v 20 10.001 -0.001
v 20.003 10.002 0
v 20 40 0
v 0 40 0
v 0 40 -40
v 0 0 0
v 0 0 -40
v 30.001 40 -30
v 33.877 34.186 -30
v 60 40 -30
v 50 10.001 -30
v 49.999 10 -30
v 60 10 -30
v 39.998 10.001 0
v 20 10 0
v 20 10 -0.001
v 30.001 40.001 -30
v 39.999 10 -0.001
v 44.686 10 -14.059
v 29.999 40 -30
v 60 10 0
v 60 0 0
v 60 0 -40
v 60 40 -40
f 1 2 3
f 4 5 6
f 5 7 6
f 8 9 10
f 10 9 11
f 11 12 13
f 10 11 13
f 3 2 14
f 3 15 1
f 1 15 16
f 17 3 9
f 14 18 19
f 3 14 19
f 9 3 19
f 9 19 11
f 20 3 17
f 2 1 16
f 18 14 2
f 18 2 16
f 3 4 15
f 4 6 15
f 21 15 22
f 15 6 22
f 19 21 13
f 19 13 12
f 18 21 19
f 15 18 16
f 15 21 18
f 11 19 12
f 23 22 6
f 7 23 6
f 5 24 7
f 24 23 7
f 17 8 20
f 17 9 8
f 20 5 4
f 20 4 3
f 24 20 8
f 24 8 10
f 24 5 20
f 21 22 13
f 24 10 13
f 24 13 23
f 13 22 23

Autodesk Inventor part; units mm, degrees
ref_plane "YZ Plane" through (0, 0, 0) normal (1, 0, 0) x (0, 1, 0)
ref_plane "XZ Plane" through (0, 0, 0) normal (0, 1, 0) x (-1, 0, 0)
sketch "草圖1" plane through (0, 0, 0) normal (0, 1, 0) x (-1, 0, 0)
  line L0 (0, 0) -> (-60, 0)
  line L1 (-60, 0) -> (-60, -40)
  line L2 (-60, -40) -> (0, -40)
  line L3 (0, -40) -> (0, 0)
  dimension "d0" = 40
  dimension "d1" = 60
extrude "擠出1" add sketch "草圖1" along normal blind 10
sketch "草圖2" plane through (0, 10, 0) normal (0, 1, 0) x (1, 0, 0)
  line L0 (0, 0) -> (60, 0) projected
  line L1 (20, 0) -> (30, 30)
  line L2 (30, 30) -> (60, 30)
  line L3 (60, 0) -> (60, 40) projected
  line L4 (60, 30) -> (60, 40)
  line L5 (60, 40) -> (0, 40) projected
  line L6 (60, 40) -> (0, 40)
  line L7 (0, 40) -> (0, 0)
  line L8 (20, 0) -> (0, 0)
  dimension "d4" = 10
  dimension "d5" = 30
  dimension "d6" = 30
extrude "擠出2" add sketch "草圖2" along normal blind 30 contours L7 L5 L3 L2 L1 L0
sketch "草圖3" plane through (0, 10, 0) normal (0, 1, 0) x (1, 0, 0)
  line L0 (0, 0) -> (60, 0) projected
  line L1 (40, 0) -> (50, 30)
  line L2 (30, 30) -> (60, 30) projected
  dimension "d9" = 10
  dimension "d10" = 20
ref_plane "工作平面1" through (20, 40, 0) normal (-0.8018, -0.5345, -0.2673) x (0.3162, 0, -0.9487)
sketch "草圖4" plane through (20, 40, 0) normal (-0.8018, -0.5345, -0.2673) x (0.3162, 0, -0.9487)
  line L0 (31.6228, 25.3546) -> (0, 25.3546) projected
  line L1 (31.6228, 25.3546) -> (31.6228, 0) projected
  line L2 (0, 0) -> (31.6228, 0) projected
  line L3 (0, 25.3546) -> (0, 0) projected
  line L4 (41.1096, 40.5674) -> (31.6228, 25.3546) projected
  line L5 (31.6228, 25.3546) -> (0, 25.3546) projected
  line L6 (0, 25.3546) -> (12.6491, 45.6383) projected
  line L7 (12.6491, 45.6383) -> (41.1096, 40.5674) projected
  line L8 (6.3246, 35.4965) -> (37.9473, 35.4965) projected
  line L9 (37.9473, 35.4965) -> (31.6228, 0)
  line L10 (31.6228, 0) -> (41.1096, 15.2128) projected
  line L11 (31.6228, 0) -> (31.6228, 25.3546)
  line L12 (37.9473, 35.4965) -> (31.6228, 25.3546)
  point P0 (-6.3246, 23.6643)
extrude "擠出3" add sketch "草圖4" along normal up to next contours L1 L2 L3 L0 | L4 L9 L1 | L0 L6 L8 L4
sketch "草圖5" plane through (0, 0, 0) normal (0, 0, 1) x (1, 0, 0)
  line L0 (-0.672, 48.4854) -> (66.1118, 48.4854)
  line L1 (66.1118, 48.4854) -> (66.1118, -3.1014)
  line L2 (66.1118, -3.1014) -> (-0.672, -3.1014)
  line L3 (-0.672, -3.1014) -> (-0.672, 48.4854)
  point P0 (0, 0)
extrude "擠出4" cut sketch "草圖5" along normal blind 30
properties part number "49"
